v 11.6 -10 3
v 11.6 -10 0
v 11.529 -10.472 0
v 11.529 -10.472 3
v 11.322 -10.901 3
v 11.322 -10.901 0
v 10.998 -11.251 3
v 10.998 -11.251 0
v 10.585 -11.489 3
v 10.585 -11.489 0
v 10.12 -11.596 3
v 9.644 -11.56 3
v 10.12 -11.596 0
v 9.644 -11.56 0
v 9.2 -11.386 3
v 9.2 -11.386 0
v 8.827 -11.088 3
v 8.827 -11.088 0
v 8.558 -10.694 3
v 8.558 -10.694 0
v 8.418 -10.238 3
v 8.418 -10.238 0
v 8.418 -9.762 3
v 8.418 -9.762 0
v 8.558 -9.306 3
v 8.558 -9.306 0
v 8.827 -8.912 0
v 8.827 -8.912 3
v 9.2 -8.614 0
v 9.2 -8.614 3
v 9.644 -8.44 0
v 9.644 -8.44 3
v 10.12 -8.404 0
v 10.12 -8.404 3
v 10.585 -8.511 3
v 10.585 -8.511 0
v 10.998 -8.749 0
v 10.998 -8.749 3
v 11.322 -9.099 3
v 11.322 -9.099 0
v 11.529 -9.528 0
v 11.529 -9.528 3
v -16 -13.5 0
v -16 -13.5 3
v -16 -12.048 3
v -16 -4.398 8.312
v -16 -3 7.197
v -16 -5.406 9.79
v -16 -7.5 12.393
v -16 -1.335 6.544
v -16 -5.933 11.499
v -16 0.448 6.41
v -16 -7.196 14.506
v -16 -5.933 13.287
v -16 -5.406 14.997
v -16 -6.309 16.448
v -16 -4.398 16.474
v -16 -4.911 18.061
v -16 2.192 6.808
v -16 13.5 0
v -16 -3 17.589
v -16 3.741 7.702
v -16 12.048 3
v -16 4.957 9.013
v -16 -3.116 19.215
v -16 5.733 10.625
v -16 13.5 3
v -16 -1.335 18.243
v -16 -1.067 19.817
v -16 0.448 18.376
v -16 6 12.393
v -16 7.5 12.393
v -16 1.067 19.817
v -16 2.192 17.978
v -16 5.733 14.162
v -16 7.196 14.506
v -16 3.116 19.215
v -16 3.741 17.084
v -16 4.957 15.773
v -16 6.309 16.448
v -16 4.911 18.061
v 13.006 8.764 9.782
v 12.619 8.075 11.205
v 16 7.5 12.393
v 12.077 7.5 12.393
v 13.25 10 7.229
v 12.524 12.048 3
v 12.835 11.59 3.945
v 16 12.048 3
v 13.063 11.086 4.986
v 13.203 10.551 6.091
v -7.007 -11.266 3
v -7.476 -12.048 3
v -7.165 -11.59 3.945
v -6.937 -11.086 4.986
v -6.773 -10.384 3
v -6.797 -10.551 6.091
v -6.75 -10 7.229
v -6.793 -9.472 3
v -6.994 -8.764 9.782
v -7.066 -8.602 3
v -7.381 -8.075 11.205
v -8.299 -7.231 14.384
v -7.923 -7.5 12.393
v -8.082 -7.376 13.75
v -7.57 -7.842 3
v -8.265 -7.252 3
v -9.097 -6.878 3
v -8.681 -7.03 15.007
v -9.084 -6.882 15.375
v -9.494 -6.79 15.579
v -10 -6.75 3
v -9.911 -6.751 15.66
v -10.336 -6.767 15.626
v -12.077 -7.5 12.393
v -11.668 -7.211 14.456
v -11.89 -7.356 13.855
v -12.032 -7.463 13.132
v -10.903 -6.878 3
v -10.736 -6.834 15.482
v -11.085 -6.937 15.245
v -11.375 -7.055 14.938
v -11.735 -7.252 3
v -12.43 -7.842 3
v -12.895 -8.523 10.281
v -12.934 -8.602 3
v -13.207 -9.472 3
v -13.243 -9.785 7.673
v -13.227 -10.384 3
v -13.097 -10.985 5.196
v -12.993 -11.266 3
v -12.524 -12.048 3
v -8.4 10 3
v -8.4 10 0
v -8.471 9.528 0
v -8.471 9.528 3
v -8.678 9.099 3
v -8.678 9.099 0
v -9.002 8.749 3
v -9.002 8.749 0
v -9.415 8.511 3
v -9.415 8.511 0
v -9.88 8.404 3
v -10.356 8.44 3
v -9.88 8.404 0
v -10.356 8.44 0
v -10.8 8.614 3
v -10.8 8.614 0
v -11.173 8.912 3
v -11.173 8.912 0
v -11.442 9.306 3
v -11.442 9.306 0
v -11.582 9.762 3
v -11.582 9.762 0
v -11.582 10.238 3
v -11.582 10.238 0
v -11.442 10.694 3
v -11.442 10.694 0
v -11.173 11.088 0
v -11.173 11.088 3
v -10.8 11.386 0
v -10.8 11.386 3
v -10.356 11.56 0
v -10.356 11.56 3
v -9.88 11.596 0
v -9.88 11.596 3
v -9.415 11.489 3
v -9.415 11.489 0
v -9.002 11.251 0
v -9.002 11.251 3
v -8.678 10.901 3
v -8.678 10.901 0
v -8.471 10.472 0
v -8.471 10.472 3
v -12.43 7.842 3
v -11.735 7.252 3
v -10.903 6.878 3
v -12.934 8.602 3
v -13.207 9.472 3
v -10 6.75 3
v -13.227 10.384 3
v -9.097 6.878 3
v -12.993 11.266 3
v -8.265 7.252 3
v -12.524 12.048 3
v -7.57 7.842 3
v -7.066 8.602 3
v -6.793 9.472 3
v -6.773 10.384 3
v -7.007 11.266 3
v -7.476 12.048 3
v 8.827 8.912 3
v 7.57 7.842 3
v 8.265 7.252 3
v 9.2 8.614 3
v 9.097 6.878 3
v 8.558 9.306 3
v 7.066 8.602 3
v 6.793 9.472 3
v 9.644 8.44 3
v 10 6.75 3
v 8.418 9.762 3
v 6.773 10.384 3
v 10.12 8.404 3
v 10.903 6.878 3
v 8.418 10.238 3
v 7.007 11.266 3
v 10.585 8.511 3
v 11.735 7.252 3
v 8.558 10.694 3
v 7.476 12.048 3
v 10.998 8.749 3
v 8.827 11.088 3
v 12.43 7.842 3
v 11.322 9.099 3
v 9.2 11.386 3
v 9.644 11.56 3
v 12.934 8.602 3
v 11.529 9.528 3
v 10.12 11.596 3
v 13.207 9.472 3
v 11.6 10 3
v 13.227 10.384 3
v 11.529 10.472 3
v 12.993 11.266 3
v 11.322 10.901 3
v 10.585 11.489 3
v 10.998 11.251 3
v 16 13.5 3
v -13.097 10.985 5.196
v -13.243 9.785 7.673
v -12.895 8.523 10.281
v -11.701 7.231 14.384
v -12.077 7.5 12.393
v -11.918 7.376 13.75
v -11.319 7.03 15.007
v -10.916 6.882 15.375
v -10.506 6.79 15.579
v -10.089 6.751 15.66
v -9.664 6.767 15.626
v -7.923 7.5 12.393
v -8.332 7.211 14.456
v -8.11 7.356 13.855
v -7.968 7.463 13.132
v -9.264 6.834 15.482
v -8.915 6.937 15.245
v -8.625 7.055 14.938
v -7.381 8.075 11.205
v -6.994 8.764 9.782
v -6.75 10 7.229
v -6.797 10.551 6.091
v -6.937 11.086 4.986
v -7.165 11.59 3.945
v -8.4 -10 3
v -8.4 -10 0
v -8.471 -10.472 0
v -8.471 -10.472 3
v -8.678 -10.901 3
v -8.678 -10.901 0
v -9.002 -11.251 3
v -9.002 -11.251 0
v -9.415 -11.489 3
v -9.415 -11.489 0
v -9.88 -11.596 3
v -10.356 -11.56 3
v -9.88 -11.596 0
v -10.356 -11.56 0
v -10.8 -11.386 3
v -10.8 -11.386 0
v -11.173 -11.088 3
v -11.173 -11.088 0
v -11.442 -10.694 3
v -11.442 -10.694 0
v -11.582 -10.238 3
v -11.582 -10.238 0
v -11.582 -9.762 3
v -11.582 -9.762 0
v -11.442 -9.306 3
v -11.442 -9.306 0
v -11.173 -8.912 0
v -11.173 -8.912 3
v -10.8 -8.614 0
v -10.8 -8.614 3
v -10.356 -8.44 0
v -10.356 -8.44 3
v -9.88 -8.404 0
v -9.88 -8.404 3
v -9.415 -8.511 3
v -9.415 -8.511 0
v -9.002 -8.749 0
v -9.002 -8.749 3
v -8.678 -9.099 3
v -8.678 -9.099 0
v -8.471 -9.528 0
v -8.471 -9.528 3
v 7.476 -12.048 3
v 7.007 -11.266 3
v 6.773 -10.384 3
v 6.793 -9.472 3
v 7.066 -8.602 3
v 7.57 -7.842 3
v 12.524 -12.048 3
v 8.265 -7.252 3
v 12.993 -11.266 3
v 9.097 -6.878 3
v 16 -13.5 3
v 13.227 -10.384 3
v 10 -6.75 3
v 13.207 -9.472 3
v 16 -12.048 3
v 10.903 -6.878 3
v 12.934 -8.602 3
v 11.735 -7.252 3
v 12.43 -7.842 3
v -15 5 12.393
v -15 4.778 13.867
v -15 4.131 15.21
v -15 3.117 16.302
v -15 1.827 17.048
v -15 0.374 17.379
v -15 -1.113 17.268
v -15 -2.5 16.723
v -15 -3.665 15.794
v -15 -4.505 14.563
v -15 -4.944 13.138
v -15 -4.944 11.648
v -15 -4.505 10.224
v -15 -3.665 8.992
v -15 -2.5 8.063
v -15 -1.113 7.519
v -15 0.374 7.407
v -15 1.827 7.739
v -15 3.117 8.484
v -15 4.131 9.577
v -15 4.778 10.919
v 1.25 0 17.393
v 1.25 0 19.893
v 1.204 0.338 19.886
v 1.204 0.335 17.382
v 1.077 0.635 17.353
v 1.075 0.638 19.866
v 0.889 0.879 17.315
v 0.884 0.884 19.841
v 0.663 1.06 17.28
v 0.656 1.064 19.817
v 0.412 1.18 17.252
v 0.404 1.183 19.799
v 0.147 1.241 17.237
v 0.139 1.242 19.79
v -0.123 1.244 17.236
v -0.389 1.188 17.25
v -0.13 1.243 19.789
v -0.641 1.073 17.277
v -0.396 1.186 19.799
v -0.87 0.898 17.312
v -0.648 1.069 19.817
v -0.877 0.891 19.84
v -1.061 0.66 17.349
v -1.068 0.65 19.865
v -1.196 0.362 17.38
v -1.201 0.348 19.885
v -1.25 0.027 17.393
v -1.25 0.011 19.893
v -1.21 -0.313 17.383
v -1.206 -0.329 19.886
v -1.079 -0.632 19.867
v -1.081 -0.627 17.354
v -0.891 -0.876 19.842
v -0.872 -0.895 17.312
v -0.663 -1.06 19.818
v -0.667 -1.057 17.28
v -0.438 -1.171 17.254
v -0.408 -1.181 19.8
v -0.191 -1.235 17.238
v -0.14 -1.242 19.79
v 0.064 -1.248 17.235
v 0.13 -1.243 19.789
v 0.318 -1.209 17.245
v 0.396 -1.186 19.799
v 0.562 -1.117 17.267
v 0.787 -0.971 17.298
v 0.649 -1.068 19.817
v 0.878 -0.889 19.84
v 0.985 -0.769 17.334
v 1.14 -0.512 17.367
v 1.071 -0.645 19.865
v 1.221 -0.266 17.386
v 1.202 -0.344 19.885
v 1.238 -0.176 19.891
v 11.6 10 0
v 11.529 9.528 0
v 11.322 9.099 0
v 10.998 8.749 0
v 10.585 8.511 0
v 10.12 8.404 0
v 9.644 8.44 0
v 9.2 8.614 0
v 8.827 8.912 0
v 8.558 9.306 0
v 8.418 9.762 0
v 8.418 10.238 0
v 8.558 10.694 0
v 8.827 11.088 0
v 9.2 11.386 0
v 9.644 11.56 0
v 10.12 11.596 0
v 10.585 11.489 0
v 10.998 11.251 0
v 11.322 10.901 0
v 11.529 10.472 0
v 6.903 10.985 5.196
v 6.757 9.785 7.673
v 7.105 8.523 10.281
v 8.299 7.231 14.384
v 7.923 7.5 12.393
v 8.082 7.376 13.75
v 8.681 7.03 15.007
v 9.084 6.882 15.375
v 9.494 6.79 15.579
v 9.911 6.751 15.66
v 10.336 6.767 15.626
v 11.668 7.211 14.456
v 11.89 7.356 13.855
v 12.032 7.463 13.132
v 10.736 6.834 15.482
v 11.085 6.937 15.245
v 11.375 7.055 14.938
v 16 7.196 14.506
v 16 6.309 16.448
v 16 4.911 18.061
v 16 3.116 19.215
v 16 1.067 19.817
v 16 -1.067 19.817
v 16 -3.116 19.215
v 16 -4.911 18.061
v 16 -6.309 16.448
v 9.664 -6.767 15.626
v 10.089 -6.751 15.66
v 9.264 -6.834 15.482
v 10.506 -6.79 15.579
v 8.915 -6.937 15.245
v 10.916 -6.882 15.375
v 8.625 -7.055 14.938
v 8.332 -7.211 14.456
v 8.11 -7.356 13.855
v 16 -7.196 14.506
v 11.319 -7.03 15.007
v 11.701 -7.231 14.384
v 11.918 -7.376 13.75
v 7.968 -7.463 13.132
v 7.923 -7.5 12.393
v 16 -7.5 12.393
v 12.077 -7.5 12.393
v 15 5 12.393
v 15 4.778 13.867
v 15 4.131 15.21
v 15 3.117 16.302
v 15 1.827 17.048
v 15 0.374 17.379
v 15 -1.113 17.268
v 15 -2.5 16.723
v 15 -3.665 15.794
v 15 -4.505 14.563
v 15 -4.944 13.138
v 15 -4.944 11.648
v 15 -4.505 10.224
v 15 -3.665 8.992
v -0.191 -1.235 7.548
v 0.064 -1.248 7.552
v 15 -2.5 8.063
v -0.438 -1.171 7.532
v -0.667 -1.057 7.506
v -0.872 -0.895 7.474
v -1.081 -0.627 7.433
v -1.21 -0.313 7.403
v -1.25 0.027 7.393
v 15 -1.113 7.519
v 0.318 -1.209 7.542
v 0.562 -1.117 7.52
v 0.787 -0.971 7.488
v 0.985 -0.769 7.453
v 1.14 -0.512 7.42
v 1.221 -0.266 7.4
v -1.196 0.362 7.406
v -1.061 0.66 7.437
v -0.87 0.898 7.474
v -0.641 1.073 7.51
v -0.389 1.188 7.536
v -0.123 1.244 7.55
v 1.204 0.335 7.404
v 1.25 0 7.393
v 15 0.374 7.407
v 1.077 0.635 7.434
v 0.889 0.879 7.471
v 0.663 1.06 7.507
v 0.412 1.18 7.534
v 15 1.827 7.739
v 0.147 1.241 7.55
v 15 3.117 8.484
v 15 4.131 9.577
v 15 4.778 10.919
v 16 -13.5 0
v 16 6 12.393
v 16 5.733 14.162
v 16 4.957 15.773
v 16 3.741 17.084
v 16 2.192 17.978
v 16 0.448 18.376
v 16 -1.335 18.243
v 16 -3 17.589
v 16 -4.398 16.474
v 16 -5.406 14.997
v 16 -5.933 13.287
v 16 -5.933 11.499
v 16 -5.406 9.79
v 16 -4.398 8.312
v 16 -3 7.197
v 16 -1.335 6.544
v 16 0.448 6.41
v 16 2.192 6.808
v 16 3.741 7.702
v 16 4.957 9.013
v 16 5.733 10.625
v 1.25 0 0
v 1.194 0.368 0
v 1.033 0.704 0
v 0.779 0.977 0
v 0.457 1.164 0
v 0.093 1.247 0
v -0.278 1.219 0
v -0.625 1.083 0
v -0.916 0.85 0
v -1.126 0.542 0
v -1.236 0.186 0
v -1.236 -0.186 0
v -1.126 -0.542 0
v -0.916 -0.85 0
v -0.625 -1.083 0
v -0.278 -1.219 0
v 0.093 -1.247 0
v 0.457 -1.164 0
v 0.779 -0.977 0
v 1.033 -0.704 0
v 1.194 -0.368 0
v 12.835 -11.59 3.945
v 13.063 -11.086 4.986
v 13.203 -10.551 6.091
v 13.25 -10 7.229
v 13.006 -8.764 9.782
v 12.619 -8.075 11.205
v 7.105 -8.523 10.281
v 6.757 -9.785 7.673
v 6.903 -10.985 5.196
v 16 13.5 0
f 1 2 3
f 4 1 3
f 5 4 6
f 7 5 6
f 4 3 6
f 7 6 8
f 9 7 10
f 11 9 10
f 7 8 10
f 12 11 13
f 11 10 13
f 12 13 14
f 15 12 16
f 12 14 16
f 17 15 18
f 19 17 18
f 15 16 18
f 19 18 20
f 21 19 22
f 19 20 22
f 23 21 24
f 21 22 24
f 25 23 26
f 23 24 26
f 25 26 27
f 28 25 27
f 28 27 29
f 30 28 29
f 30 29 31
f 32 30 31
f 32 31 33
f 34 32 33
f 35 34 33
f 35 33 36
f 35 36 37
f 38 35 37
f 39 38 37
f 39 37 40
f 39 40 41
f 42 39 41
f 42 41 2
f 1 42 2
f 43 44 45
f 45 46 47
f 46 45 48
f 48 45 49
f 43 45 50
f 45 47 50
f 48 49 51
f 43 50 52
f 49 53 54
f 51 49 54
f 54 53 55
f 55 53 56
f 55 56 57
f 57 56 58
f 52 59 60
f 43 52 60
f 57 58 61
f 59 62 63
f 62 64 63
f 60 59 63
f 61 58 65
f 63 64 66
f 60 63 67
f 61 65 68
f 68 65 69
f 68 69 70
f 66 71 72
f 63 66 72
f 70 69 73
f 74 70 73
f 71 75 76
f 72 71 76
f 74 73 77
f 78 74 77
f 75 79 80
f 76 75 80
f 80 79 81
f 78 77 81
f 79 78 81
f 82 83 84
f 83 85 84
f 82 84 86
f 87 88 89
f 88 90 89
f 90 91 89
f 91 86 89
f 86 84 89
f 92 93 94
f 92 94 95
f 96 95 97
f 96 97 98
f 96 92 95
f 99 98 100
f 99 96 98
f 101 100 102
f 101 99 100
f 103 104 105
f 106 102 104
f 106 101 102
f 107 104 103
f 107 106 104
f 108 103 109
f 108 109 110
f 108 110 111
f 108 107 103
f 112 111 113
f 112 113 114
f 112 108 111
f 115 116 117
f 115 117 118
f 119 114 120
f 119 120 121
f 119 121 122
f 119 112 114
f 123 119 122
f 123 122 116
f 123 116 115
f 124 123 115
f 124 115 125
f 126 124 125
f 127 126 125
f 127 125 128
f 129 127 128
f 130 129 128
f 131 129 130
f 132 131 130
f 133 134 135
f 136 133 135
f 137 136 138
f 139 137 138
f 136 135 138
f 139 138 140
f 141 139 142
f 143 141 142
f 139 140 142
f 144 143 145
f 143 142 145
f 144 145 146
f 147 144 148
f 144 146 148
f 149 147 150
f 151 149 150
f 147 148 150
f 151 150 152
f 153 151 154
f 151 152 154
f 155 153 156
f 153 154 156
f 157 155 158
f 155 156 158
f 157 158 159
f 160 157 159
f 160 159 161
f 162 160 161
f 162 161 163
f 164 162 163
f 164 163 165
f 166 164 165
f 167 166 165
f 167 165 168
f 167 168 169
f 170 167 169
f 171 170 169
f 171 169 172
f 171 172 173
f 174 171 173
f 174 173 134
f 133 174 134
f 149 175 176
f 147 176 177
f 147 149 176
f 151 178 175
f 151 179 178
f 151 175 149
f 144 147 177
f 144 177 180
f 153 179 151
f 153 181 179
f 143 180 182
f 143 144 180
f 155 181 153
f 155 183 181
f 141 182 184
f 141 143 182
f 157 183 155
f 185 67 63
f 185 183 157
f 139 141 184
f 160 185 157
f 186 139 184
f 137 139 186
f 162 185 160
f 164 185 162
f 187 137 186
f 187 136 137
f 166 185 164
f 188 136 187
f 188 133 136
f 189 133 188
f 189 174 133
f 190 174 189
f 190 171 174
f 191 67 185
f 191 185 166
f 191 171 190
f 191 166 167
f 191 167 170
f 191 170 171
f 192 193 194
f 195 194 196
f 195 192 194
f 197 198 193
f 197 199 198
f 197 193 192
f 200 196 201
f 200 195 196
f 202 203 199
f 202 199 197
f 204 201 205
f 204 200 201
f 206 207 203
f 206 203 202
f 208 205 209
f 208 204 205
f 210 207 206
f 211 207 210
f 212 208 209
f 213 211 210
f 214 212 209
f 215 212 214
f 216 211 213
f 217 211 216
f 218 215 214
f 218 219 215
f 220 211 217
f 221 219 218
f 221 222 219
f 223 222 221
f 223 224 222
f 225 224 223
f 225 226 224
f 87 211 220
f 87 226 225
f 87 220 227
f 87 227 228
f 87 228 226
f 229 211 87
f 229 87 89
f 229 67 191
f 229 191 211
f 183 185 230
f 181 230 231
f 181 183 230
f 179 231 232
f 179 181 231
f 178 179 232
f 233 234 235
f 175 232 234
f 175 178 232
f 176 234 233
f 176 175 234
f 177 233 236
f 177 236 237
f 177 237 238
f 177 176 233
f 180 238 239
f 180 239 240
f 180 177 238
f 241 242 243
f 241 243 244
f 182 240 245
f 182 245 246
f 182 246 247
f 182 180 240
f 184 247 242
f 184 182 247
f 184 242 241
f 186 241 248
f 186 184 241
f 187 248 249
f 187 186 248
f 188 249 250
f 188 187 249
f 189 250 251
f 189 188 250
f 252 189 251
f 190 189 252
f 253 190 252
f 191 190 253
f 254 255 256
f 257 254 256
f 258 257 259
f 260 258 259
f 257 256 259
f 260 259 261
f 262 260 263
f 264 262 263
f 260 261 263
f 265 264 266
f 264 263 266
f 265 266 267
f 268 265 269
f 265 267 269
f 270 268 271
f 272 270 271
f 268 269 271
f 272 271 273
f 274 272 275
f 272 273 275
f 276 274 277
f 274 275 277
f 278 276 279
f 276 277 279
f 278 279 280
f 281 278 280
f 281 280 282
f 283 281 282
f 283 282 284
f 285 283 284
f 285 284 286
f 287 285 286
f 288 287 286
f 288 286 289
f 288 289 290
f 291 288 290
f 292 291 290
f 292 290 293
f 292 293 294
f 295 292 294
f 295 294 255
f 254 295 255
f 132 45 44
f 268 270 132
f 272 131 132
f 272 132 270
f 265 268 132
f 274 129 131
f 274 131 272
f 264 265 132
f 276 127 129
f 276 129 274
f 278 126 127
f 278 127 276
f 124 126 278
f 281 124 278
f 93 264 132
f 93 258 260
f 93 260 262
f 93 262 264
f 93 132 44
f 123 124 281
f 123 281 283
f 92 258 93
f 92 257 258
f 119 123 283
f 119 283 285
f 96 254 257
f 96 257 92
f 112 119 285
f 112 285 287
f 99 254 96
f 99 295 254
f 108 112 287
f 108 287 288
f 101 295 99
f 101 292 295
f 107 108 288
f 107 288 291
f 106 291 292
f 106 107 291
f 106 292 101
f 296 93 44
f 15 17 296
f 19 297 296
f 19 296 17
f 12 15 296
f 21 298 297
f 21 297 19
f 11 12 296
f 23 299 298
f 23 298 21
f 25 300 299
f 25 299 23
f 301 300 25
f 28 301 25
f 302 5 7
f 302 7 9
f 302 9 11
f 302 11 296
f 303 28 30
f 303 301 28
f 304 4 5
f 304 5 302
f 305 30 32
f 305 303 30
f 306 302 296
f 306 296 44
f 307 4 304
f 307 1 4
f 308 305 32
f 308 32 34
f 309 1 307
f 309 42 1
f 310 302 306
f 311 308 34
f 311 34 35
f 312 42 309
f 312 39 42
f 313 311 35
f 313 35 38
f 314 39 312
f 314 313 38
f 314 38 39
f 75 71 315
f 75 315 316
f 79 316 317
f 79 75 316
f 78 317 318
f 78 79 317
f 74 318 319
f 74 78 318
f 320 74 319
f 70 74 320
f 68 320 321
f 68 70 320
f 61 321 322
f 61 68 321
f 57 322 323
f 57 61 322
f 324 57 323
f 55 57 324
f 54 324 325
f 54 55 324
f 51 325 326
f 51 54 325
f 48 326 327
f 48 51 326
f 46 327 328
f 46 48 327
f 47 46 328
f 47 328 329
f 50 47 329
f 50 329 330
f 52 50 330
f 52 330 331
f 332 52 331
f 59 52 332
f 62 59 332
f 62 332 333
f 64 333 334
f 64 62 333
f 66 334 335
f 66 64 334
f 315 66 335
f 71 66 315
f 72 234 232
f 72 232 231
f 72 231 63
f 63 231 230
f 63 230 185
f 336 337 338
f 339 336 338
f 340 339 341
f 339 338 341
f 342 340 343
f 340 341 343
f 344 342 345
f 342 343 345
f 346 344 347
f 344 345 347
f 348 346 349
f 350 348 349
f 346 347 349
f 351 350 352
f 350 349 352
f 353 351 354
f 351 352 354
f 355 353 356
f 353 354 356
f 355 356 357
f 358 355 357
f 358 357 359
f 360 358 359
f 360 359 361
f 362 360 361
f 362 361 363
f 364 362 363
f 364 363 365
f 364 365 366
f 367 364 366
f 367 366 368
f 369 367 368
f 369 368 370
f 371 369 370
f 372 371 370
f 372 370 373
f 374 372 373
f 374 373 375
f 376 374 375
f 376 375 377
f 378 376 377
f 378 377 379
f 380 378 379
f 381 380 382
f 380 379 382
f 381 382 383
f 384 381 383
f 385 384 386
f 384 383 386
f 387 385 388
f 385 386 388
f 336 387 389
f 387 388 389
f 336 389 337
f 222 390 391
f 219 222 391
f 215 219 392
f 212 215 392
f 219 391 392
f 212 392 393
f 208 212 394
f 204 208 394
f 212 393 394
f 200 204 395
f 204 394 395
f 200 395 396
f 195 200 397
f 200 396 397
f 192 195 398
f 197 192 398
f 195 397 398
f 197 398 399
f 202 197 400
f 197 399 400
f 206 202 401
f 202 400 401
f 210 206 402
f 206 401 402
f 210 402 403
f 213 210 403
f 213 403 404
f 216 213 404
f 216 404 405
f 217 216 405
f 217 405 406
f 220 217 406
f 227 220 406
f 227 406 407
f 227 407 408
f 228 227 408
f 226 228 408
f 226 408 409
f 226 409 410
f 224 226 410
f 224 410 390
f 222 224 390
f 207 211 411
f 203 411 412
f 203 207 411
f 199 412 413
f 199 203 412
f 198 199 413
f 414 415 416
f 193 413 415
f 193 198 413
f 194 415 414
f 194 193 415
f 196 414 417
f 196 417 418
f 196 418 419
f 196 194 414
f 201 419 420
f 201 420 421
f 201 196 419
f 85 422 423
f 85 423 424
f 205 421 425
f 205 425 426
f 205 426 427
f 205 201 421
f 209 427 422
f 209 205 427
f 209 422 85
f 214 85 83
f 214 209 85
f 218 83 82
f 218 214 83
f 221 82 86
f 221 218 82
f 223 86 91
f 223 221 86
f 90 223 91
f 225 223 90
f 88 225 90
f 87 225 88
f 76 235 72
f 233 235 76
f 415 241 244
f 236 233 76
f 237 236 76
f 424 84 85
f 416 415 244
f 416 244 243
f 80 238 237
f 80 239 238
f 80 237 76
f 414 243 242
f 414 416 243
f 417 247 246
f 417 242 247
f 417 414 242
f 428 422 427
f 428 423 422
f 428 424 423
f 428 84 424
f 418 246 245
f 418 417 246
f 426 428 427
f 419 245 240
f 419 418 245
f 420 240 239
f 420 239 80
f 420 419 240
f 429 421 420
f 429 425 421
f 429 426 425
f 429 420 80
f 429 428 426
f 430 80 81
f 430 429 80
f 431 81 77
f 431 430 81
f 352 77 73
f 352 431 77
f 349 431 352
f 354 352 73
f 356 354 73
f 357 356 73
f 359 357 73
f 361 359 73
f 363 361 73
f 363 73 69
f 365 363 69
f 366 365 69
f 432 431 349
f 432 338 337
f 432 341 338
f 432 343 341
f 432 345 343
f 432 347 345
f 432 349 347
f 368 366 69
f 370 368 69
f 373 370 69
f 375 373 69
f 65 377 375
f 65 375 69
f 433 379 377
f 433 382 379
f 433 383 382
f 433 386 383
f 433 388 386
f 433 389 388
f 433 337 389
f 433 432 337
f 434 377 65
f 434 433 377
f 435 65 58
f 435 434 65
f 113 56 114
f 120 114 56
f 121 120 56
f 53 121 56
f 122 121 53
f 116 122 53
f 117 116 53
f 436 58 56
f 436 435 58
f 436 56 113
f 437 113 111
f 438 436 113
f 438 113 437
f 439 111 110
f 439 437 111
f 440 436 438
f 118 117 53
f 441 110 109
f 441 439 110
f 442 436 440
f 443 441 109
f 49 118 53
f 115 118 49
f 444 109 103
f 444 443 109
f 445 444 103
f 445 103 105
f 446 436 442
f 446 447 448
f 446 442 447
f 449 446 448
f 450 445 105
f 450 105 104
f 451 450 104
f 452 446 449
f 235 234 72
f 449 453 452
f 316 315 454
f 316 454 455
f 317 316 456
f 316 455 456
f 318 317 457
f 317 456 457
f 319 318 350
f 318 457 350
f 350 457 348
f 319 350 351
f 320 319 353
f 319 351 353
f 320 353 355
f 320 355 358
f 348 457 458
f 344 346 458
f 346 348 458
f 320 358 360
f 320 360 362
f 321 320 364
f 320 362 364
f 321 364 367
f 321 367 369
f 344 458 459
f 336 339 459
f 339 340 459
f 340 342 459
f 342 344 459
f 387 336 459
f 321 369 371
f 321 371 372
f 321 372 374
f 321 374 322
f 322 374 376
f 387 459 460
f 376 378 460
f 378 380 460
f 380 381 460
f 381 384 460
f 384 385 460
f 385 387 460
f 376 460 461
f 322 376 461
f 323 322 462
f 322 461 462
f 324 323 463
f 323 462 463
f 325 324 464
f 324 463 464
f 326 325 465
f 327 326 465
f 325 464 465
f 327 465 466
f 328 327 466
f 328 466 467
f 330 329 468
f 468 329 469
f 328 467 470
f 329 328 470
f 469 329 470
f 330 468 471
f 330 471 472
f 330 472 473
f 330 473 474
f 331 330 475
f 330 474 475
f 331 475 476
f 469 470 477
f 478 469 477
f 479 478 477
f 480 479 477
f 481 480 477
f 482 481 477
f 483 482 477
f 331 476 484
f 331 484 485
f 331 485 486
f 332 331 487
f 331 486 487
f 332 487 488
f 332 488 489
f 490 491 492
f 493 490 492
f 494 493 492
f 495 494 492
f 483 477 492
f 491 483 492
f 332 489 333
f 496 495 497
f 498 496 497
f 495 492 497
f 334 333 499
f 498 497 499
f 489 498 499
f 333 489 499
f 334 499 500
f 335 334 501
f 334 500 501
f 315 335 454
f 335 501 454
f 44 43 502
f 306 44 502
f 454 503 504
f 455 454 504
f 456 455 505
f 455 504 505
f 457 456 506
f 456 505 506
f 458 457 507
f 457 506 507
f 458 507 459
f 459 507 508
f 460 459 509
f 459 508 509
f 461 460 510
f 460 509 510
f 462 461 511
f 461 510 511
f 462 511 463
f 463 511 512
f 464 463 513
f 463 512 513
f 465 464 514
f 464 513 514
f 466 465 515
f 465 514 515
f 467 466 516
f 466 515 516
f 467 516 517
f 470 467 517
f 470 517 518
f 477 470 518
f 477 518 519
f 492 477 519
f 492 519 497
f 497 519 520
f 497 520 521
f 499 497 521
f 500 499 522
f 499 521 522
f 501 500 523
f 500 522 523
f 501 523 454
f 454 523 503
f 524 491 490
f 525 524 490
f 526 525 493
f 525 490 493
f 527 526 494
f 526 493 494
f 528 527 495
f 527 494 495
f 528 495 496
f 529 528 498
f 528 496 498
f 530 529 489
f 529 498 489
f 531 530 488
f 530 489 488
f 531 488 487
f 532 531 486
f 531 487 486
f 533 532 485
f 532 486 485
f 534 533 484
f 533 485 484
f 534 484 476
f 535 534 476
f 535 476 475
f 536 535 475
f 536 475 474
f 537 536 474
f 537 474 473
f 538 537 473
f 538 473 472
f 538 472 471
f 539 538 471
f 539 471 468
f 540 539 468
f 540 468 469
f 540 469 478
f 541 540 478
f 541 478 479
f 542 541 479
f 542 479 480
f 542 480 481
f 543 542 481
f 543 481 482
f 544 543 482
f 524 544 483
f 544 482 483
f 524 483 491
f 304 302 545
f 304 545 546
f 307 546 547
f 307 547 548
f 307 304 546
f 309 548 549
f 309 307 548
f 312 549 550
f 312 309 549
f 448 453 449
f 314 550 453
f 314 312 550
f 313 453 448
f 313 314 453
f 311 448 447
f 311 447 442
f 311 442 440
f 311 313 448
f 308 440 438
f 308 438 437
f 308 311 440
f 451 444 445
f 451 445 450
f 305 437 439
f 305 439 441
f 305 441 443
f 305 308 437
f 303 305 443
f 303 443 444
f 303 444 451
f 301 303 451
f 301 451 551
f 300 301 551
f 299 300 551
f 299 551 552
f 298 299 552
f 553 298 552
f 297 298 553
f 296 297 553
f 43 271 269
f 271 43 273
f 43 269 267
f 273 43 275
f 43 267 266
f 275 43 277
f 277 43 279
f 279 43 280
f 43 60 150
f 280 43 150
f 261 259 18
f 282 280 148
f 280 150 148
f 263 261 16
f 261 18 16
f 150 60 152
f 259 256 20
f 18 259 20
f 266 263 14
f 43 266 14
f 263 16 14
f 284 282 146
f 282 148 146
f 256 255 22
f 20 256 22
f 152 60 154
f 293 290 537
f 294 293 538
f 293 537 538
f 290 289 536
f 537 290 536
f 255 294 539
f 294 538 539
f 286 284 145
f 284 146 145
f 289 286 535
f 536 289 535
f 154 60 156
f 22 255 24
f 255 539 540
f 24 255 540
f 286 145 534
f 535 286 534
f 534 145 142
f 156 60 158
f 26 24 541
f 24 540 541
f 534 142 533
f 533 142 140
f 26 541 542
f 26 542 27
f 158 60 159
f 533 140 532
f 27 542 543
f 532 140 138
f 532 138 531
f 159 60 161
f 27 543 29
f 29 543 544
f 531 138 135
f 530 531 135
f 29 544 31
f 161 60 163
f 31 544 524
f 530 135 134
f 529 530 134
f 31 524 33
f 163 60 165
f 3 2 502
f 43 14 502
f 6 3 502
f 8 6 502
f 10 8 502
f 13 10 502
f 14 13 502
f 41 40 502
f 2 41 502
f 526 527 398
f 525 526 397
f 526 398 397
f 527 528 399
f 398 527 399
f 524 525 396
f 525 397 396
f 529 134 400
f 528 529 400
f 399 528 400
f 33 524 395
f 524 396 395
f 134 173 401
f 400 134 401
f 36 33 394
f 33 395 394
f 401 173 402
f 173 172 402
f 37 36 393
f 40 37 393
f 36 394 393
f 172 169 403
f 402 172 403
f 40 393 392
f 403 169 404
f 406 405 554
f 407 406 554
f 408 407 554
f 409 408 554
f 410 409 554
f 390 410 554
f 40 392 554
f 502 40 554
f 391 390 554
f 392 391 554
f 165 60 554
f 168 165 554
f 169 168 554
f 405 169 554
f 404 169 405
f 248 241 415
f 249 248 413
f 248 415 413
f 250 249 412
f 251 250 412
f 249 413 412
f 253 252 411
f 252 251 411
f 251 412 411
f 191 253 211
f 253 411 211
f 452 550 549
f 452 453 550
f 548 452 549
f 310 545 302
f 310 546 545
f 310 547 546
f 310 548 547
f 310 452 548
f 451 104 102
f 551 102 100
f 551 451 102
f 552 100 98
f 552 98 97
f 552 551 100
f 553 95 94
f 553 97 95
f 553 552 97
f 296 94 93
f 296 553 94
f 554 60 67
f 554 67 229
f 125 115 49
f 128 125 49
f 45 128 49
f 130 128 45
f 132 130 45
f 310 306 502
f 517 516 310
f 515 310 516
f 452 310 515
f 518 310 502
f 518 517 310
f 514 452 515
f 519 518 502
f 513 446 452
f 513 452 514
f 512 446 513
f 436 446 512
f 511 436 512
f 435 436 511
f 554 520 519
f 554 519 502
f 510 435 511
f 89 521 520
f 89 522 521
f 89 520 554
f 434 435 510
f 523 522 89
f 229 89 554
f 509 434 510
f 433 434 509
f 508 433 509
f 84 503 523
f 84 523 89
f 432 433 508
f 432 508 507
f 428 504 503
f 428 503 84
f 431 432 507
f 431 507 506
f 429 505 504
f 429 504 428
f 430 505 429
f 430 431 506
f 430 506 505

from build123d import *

# Parameters (mm, degrees)
SKETCH_W        = 32
SKETCH_H        = 27
SKETCH_R        = 1.65
PAD_DEPTH       = 3
SKETCH001_R     = 5
PAD001_DEPTH    = 32
SKETCH002_R     = 1.6
POCKET_DEPTH    = 19.894216
SKETCH003_R     = 3.25
POCKET001_DEPTH = 16.894216
CHAMFER_SIZE    = 1
CHAMFER001_SIZE = 1
SKETCH004_R     = 1.25
POCKET002_DEPTH = 20.001


with BuildPart() as part:
    # Sketch → Pad (new body)
    with BuildSketch(Plane.XY):
        Rectangle(SKETCH_W, SKETCH_H)
        with Locations((-10, -10)):
            Circle(SKETCH_R, mode=Mode.SUBTRACT)
        with Locations((-10, 10)):
            Circle(SKETCH_R, mode=Mode.SUBTRACT)
        with Locations((10, 10)):
            Circle(SKETCH_R, mode=Mode.SUBTRACT)
        with Locations((10, -10)):
            Circle(SKETCH_R, mode=Mode.SUBTRACT)
    extrude(amount=PAD_DEPTH)

    # Sketch001 (on Face2 of Pad) → Pad001 (join)
    with BuildSketch(Plane.YZ.offset(16)):
        with BuildLine():
            ThreePointArc((7.5, 12.393216), (0, 19.893216), (-7.5, 12.393216))
            Line((-7.5, 12.393216), (-13.5, 0))
            Line((-13.5, 0), (13.5, 0))
            Line((7.5, 12.393216), (13.5, 0))
        make_face()
        with Locations((0, 12.393216)):
            Circle(SKETCH001_R, mode=Mode.SUBTRACT)
    extrude(amount=-PAD001_DEPTH)

    # Sketch002 (on Face4 of Pad001) → Pocket (cut, through all)
    with BuildSketch(Plane(origin=(0, 0, 0), x_dir=(1, 0, 0), z_dir=(0, 0, -1))):
        with Locations((10, 10)):
            Circle(SKETCH002_R)
        with Locations((-10, 10)):
            Circle(SKETCH002_R)
        with Locations((-10, -10)):
            Circle(SKETCH002_R)
        with Locations((10, -10)):
            Circle(SKETCH002_R)
    extrude(amount=-POCKET_DEPTH, mode=Mode.SUBTRACT)

    # Sketch003 (on Face18 of Pocket) → Pocket001 (cut, through all)
    with BuildSketch(Plane.XY.offset(3)):
        with Locations((-10, 10)):
            Circle(SKETCH003_R)
        with Locations((10, 10)):
            Circle(SKETCH003_R)
        with Locations((-10, -10)):
            Circle(SKETCH003_R)
        with Locations((10, -10)):
            Circle(SKETCH003_R)
    extrude(amount=POCKET001_DEPTH, mode=Mode.SUBTRACT)

    # Chamfer
    chamfer_edges = [part.edges().sort_by_distance(p)[0] for p in [
        (16, -5, 12.393216),
    ]]
    chamfer(chamfer_edges, length=CHAMFER_SIZE)

    # Chamfer001
    chamfer001_edges = [part.edges().sort_by_distance(p)[0] for p in [
        (-16, -5, 12.393216),
    ]]
    chamfer(chamfer001_edges, length=CHAMFER001_SIZE)

    # Sketch004 → Pocket002 (cut, through all)
    with BuildSketch(Plane.XY.offset(20)):
        Circle(SKETCH004_R)
    extrude(amount=-POCKET002_DEPTH, mode=Mode.SUBTRACT)


solid = part.part
